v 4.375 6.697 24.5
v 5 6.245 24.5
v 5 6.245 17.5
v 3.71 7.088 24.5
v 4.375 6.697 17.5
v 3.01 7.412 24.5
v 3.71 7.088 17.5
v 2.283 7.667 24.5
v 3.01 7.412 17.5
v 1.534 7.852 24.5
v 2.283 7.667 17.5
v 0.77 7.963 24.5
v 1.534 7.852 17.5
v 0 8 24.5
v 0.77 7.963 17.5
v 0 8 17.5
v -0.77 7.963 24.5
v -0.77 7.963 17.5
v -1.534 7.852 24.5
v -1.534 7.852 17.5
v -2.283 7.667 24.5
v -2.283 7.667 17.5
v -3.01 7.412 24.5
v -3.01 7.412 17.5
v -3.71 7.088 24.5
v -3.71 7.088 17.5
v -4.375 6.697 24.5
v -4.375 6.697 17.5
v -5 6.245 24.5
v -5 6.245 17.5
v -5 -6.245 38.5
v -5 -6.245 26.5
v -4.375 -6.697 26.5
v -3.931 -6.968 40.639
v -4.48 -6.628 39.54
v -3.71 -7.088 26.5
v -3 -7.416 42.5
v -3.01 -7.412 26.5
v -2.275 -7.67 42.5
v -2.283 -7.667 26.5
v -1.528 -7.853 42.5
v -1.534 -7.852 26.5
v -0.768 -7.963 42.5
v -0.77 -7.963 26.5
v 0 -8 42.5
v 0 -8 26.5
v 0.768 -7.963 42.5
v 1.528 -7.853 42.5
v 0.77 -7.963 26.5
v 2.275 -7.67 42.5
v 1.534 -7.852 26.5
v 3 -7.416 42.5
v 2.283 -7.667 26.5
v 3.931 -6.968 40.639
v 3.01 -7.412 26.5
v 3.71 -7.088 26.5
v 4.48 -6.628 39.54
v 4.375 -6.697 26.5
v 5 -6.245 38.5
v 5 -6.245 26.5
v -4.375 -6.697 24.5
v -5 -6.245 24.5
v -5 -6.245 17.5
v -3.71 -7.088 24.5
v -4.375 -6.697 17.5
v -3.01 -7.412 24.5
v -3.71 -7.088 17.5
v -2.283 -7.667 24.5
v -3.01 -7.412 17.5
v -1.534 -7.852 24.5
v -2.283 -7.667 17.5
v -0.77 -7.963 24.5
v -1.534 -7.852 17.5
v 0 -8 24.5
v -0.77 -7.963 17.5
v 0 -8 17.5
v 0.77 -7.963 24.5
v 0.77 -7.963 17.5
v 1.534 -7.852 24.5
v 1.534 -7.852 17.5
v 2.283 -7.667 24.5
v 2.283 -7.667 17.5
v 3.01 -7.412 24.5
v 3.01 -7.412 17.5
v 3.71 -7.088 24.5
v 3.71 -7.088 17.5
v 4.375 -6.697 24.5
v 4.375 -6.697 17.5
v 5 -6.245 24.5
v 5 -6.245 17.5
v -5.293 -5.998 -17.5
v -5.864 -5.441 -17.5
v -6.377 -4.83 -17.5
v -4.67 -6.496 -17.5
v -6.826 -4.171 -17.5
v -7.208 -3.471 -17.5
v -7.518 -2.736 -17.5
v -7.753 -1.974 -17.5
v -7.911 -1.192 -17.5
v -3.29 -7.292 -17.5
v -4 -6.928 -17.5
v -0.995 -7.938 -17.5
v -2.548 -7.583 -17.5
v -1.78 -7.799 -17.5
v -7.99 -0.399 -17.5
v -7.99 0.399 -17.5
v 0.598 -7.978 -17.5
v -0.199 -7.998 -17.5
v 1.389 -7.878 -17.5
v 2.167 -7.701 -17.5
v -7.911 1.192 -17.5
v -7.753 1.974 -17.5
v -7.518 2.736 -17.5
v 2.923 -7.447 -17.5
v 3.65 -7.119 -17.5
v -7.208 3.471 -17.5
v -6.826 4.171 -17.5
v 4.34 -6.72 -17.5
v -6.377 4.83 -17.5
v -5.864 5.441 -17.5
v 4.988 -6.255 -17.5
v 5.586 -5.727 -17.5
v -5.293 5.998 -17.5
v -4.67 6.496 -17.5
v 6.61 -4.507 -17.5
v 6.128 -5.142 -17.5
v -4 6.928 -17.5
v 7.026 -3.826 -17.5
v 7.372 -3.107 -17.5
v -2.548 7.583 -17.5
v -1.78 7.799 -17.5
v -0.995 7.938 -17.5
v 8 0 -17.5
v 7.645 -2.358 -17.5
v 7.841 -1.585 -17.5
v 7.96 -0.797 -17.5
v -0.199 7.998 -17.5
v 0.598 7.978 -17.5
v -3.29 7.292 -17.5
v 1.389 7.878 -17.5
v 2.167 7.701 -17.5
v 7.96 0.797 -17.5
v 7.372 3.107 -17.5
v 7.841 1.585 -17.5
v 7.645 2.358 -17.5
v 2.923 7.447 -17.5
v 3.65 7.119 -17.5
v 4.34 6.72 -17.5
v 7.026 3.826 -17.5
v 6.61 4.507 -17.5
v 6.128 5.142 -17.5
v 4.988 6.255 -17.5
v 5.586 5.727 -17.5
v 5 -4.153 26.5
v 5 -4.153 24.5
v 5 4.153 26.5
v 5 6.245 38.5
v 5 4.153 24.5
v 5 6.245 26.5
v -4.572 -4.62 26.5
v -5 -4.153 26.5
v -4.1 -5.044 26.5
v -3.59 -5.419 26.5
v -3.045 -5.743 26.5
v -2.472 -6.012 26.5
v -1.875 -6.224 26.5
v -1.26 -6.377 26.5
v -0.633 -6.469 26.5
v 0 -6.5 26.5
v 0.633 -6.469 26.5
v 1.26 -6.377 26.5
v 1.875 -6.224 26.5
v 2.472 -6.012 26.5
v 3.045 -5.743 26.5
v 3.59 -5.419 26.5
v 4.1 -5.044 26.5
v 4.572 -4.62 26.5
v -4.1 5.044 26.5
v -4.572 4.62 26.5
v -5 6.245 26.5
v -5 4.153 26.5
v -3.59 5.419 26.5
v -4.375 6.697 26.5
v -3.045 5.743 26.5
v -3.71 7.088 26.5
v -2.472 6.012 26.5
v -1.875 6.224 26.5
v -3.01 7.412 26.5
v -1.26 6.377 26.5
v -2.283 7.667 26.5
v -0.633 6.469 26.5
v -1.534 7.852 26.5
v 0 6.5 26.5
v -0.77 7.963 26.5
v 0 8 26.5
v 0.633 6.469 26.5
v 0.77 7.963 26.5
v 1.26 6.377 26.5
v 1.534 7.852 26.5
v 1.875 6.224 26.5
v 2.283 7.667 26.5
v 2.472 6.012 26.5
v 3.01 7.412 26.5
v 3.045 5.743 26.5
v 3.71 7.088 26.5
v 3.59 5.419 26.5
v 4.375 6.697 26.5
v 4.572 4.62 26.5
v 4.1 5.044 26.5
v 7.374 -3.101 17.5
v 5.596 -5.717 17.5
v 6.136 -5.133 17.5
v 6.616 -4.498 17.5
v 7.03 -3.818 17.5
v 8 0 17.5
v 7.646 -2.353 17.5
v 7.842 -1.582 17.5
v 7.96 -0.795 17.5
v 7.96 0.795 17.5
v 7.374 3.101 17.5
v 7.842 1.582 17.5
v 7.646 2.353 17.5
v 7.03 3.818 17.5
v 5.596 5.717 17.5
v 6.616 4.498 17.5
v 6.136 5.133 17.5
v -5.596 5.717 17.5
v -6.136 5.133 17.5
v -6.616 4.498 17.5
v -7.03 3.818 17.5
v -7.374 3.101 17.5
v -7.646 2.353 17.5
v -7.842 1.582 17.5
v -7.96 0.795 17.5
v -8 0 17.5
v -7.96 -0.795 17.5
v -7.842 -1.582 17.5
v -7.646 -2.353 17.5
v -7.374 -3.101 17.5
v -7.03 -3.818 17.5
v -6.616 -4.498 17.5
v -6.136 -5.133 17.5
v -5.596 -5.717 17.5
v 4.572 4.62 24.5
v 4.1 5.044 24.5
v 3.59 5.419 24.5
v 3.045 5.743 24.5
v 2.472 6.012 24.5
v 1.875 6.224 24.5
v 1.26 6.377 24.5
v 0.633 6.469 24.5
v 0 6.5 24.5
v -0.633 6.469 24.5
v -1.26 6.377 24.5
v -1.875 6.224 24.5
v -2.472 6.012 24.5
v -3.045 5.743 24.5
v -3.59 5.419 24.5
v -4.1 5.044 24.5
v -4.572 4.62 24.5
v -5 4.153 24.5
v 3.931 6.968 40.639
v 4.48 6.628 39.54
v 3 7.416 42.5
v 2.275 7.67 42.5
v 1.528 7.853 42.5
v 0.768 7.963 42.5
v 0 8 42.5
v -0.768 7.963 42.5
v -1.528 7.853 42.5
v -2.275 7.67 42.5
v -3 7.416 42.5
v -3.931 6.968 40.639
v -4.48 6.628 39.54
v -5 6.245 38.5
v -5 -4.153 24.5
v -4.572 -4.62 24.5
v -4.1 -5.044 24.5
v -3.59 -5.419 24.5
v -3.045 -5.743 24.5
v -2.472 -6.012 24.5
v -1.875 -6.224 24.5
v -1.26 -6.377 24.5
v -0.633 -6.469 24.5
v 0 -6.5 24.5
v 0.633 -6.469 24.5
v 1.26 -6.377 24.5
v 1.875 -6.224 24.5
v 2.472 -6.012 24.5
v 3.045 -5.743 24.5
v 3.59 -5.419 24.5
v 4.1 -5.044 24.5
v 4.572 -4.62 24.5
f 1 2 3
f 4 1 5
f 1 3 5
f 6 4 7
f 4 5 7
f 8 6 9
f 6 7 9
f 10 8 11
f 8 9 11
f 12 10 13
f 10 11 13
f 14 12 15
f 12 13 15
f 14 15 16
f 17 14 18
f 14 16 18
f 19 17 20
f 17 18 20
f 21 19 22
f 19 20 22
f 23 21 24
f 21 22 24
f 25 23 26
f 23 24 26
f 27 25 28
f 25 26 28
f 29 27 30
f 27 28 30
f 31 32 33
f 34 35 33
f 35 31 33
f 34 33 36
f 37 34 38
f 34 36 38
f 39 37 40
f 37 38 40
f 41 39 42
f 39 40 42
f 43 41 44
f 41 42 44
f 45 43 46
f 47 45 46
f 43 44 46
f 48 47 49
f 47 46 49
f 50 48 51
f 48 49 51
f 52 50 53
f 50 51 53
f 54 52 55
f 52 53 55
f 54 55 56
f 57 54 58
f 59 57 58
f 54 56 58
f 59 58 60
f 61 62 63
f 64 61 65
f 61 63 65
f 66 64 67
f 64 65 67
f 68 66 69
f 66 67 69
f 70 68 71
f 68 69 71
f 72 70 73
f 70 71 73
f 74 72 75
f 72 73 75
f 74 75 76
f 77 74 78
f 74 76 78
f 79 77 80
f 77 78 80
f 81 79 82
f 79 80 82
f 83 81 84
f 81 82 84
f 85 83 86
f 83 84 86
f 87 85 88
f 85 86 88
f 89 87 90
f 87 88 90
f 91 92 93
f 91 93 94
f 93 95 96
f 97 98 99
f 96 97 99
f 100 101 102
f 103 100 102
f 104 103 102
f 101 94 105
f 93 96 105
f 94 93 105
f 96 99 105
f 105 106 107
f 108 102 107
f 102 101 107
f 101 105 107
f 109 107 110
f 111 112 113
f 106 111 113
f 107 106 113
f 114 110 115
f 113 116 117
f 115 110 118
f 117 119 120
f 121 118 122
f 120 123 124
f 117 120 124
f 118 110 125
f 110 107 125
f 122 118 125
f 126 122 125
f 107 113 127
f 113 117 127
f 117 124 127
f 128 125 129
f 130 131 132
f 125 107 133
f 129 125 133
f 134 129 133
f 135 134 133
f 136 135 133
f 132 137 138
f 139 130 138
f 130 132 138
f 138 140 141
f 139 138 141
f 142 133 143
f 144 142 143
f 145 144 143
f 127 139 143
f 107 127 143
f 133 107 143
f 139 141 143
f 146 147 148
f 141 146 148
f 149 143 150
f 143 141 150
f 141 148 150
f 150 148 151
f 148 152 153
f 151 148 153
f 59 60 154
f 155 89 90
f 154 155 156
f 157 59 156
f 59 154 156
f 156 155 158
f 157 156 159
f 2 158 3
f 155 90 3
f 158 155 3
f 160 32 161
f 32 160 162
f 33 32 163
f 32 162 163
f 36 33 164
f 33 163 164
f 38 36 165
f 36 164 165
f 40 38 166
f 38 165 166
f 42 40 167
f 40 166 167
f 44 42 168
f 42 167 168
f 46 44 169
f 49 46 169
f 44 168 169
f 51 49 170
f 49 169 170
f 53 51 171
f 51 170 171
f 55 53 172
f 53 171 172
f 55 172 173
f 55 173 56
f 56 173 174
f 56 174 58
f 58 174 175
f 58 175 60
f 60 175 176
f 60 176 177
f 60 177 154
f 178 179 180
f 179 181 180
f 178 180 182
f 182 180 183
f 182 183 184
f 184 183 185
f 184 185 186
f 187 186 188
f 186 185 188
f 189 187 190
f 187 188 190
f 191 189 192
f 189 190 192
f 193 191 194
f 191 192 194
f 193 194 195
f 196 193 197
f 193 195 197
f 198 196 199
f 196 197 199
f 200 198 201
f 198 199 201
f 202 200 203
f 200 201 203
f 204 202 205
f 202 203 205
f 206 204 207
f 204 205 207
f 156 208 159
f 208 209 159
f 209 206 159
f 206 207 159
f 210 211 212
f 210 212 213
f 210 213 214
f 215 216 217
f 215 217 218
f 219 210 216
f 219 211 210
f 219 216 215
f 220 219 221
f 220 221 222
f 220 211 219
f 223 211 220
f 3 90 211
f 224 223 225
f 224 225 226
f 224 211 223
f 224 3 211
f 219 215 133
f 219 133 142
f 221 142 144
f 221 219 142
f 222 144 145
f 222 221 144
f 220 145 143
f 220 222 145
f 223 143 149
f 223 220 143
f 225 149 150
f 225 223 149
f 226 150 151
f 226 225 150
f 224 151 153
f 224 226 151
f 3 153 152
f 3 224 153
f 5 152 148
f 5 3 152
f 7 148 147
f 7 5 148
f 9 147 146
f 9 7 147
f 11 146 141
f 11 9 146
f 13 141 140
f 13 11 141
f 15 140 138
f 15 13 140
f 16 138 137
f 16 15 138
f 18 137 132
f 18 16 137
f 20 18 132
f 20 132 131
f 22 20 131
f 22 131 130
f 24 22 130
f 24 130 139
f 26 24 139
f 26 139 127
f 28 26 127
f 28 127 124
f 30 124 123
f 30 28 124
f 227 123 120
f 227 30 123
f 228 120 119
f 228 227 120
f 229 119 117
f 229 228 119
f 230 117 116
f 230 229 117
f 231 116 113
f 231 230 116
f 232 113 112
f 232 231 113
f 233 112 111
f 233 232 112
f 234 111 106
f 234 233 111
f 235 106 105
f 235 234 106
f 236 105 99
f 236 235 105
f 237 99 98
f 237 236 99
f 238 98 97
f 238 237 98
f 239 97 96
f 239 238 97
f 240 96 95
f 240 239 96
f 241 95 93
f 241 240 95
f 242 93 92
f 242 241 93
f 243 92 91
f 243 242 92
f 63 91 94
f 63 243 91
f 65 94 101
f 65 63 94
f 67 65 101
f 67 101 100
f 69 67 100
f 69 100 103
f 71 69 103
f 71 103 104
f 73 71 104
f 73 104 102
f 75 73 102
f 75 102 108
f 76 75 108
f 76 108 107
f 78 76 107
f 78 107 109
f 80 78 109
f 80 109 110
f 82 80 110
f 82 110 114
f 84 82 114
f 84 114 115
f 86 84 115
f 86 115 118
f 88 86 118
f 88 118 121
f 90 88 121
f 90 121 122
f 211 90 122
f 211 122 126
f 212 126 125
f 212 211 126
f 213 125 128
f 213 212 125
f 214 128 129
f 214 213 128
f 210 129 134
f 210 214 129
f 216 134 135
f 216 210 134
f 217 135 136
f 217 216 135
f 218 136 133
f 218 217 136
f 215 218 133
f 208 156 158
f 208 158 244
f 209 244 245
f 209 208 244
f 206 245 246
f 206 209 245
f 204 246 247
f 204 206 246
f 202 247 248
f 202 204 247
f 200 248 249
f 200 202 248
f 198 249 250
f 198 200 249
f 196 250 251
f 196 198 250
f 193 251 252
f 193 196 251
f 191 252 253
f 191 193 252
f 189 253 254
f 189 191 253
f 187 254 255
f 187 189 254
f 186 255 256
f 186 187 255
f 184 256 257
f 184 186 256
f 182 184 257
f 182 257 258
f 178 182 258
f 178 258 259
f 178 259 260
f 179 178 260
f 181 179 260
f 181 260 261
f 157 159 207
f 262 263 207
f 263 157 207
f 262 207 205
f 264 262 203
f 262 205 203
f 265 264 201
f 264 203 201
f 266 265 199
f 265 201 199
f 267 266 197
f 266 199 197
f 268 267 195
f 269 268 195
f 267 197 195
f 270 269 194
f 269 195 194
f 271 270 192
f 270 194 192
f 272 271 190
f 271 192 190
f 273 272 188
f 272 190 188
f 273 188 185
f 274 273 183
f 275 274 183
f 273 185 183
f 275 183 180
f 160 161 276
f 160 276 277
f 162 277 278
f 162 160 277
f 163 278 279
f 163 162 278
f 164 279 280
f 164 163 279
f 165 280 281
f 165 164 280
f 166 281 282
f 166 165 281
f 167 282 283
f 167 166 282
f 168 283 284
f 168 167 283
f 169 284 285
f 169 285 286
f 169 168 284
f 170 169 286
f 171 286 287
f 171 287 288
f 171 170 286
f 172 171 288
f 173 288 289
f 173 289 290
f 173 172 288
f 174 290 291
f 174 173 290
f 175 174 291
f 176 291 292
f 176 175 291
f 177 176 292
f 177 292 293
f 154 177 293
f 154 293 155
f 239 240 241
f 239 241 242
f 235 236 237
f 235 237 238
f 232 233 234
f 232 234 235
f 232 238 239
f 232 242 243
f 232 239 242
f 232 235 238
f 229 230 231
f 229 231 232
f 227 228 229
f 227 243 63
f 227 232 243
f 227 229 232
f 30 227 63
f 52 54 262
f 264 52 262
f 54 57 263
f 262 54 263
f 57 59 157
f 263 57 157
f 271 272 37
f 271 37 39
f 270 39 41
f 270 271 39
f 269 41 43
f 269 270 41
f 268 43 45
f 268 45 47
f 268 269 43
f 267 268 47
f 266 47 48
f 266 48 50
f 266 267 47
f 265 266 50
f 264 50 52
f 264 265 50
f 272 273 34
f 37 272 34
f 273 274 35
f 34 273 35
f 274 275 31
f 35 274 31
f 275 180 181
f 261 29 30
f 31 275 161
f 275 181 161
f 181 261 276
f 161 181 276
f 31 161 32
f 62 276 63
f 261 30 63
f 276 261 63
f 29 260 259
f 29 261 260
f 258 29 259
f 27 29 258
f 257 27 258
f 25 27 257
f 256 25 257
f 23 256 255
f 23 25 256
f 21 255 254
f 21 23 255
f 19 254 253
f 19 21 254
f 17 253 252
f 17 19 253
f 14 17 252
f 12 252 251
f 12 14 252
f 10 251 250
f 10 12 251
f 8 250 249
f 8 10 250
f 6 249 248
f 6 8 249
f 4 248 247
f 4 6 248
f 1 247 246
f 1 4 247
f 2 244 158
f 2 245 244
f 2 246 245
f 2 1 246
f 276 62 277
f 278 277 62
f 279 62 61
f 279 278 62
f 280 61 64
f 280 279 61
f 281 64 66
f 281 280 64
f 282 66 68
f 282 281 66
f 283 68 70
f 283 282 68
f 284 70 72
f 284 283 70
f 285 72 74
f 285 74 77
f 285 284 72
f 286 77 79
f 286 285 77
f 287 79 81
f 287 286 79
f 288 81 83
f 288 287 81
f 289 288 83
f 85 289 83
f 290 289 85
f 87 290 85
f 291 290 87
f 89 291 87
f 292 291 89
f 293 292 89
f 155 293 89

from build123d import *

# Parameters (mm, degrees)
F0_R     = 8
F1_DEPTH = 17.5
F3_DEPTH = 25
F4_SIZE2 = 4
F4_SIZE  = 2
F6_R     = 8
F6_R_2   = 6.5
F7_DEPTH = 2


with BuildPart() as f1:
    # F0 (on Top) → F1 (new body, symmetric)
    with BuildSketch(Plane.XY):
        Circle(F0_R)
    extrude(amount=F1_DEPTH, both=True)

    # F2 (on face) → F3 (join)
    with BuildSketch(Plane.XY.offset(17.5)):
        with BuildLine():
            ThreePointArc((5, 6.2449979984), (0, 8), (-5, 6.2449979984))
            Line((-5, 6.2449979984), (-5, -6.2449979984))
            ThreePointArc((-5, -6.2449979984), (0, -8), (5, -6.2449979984))
            Line((5, -6.2449979984), (5, 6.2449979984))
        make_face()
    extrude(amount=F3_DEPTH)

    # F4
    f4_edges = [f1.edges().sort_by_distance(p)[0] for p in [
        (-5, 0, 42.5),
        (5, 0, 42.5),
    ]]
    f4_side = f1.faces().sort_by_distance((0, 0, 42.5))[0]
    chamfer(f4_edges, length=F4_SIZE, length2=F4_SIZE2, reference=f4_side)

    # F6 (on offset) → F7 (cut)
    with BuildSketch(Plane.XY.offset(26.5)):
        Circle(F6_R)
        Circle(F6_R_2, mode=Mode.SUBTRACT)
    extrude(amount=-F7_DEPTH, mode=Mode.SUBTRACT)


solid = f1.part
